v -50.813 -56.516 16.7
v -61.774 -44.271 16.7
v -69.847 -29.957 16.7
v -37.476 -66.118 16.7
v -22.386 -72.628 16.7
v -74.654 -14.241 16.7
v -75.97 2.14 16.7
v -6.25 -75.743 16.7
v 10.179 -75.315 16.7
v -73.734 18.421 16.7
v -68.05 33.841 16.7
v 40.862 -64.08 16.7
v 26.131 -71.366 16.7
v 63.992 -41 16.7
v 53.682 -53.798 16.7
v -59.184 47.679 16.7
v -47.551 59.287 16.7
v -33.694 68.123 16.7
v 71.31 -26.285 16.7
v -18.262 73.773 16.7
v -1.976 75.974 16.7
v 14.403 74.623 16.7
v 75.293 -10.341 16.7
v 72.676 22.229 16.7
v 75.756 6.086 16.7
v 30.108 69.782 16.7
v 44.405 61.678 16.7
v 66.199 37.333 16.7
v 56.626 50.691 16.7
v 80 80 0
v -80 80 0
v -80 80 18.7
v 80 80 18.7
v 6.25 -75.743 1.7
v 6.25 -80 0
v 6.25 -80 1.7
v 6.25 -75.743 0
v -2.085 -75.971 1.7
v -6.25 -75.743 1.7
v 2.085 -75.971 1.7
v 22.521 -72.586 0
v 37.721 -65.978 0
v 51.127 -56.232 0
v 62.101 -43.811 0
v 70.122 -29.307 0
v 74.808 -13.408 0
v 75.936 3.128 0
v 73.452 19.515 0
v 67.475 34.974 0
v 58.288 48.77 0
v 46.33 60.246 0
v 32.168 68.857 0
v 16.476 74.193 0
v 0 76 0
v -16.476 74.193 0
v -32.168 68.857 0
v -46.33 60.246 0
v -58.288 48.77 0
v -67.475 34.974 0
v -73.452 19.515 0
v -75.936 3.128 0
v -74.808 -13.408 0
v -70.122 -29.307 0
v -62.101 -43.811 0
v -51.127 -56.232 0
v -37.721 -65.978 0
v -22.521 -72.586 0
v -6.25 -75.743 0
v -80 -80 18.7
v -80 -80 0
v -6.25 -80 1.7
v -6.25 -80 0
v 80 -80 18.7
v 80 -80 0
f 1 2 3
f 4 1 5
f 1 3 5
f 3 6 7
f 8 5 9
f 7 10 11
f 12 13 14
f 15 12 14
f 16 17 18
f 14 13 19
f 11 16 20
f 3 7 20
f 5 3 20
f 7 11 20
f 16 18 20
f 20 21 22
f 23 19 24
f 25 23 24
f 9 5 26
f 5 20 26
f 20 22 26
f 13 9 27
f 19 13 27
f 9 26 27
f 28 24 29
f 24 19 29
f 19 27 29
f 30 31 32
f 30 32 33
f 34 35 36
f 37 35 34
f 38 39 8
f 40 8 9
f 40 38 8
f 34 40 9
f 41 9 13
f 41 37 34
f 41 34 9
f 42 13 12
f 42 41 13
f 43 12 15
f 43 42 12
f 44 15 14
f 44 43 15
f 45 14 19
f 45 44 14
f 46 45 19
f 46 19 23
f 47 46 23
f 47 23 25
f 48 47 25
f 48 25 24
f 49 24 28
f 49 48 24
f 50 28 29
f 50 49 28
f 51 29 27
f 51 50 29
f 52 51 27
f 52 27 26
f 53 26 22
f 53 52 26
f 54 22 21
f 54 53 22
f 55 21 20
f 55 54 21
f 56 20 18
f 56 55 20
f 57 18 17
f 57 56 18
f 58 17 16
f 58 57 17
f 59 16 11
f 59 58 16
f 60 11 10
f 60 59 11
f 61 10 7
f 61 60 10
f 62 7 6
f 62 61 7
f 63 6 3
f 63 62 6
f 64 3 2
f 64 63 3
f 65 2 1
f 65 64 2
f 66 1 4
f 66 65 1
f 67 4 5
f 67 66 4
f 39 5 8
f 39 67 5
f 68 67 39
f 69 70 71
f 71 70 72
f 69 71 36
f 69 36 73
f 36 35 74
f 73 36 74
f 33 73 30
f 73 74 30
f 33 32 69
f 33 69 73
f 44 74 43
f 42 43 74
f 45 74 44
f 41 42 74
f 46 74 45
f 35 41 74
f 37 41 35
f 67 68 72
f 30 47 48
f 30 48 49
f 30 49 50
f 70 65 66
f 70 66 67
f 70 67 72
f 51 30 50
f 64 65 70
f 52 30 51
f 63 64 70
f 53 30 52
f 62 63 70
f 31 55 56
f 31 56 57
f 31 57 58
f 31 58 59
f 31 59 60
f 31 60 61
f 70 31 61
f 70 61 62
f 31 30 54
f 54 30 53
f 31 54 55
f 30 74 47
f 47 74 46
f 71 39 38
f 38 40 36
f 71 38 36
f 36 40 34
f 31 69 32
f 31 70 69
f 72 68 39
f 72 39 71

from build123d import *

# Parameters (mm, degrees)
P_IDAT_VYSUNUT_M1_DEPTH = 1.7
SKICA2_W                = 160
SKICA2_H                = 160
SKICA2_R                = 76
P_IDAT_VYSUNUT_M2_DEPTH = 15
SKICA4_W                = 160
SKICA4_H                = 160
P_IDAT_VYSUNUT_M3_DEPTH = 2


with BuildPart() as part:
    # Skica1 → Přidat vysunutím1 (new body)
    with BuildSketch(Plane.XY):
        with BuildLine():
            Line((-6.25, -75.742573893), (-6.25, -80))
            Line((-6.25, -80), (-80, -80))
            Line((-80, -80), (-80, 80))
            Line((-80, 80), (80, 80))
            Line((80, 80), (80, -80))
            Line((80, -80), (6.25, -80))
            Line((6.25, -80), (6.25, -75.742573893))
            ThreePointArc((6.25, -75.742573893), (0, 76), (-6.25, -75.742573893))
        make_face()
    extrude(amount=P_IDAT_VYSUNUT_M1_DEPTH)

    # Skica2 → Přidat vysunutím2 (add)
    with BuildSketch(Plane.XY.offset(1.7)):
        Rectangle(SKICA2_W, SKICA2_H)
        with Locations(Location((0, 0, 0), (0, 0, 265.282848868))):
            Circle(SKICA2_R, mode=Mode.SUBTRACT)
    extrude(amount=P_IDAT_VYSUNUT_M2_DEPTH)

    # Skica4 → Přidat vysunutím3 (add)
    with BuildSketch(Plane.XY.offset(16.7)):
        Rectangle(SKICA4_W, SKICA4_H)
    extrude(amount=P_IDAT_VYSUNUT_M3_DEPTH)


solid = part.part
